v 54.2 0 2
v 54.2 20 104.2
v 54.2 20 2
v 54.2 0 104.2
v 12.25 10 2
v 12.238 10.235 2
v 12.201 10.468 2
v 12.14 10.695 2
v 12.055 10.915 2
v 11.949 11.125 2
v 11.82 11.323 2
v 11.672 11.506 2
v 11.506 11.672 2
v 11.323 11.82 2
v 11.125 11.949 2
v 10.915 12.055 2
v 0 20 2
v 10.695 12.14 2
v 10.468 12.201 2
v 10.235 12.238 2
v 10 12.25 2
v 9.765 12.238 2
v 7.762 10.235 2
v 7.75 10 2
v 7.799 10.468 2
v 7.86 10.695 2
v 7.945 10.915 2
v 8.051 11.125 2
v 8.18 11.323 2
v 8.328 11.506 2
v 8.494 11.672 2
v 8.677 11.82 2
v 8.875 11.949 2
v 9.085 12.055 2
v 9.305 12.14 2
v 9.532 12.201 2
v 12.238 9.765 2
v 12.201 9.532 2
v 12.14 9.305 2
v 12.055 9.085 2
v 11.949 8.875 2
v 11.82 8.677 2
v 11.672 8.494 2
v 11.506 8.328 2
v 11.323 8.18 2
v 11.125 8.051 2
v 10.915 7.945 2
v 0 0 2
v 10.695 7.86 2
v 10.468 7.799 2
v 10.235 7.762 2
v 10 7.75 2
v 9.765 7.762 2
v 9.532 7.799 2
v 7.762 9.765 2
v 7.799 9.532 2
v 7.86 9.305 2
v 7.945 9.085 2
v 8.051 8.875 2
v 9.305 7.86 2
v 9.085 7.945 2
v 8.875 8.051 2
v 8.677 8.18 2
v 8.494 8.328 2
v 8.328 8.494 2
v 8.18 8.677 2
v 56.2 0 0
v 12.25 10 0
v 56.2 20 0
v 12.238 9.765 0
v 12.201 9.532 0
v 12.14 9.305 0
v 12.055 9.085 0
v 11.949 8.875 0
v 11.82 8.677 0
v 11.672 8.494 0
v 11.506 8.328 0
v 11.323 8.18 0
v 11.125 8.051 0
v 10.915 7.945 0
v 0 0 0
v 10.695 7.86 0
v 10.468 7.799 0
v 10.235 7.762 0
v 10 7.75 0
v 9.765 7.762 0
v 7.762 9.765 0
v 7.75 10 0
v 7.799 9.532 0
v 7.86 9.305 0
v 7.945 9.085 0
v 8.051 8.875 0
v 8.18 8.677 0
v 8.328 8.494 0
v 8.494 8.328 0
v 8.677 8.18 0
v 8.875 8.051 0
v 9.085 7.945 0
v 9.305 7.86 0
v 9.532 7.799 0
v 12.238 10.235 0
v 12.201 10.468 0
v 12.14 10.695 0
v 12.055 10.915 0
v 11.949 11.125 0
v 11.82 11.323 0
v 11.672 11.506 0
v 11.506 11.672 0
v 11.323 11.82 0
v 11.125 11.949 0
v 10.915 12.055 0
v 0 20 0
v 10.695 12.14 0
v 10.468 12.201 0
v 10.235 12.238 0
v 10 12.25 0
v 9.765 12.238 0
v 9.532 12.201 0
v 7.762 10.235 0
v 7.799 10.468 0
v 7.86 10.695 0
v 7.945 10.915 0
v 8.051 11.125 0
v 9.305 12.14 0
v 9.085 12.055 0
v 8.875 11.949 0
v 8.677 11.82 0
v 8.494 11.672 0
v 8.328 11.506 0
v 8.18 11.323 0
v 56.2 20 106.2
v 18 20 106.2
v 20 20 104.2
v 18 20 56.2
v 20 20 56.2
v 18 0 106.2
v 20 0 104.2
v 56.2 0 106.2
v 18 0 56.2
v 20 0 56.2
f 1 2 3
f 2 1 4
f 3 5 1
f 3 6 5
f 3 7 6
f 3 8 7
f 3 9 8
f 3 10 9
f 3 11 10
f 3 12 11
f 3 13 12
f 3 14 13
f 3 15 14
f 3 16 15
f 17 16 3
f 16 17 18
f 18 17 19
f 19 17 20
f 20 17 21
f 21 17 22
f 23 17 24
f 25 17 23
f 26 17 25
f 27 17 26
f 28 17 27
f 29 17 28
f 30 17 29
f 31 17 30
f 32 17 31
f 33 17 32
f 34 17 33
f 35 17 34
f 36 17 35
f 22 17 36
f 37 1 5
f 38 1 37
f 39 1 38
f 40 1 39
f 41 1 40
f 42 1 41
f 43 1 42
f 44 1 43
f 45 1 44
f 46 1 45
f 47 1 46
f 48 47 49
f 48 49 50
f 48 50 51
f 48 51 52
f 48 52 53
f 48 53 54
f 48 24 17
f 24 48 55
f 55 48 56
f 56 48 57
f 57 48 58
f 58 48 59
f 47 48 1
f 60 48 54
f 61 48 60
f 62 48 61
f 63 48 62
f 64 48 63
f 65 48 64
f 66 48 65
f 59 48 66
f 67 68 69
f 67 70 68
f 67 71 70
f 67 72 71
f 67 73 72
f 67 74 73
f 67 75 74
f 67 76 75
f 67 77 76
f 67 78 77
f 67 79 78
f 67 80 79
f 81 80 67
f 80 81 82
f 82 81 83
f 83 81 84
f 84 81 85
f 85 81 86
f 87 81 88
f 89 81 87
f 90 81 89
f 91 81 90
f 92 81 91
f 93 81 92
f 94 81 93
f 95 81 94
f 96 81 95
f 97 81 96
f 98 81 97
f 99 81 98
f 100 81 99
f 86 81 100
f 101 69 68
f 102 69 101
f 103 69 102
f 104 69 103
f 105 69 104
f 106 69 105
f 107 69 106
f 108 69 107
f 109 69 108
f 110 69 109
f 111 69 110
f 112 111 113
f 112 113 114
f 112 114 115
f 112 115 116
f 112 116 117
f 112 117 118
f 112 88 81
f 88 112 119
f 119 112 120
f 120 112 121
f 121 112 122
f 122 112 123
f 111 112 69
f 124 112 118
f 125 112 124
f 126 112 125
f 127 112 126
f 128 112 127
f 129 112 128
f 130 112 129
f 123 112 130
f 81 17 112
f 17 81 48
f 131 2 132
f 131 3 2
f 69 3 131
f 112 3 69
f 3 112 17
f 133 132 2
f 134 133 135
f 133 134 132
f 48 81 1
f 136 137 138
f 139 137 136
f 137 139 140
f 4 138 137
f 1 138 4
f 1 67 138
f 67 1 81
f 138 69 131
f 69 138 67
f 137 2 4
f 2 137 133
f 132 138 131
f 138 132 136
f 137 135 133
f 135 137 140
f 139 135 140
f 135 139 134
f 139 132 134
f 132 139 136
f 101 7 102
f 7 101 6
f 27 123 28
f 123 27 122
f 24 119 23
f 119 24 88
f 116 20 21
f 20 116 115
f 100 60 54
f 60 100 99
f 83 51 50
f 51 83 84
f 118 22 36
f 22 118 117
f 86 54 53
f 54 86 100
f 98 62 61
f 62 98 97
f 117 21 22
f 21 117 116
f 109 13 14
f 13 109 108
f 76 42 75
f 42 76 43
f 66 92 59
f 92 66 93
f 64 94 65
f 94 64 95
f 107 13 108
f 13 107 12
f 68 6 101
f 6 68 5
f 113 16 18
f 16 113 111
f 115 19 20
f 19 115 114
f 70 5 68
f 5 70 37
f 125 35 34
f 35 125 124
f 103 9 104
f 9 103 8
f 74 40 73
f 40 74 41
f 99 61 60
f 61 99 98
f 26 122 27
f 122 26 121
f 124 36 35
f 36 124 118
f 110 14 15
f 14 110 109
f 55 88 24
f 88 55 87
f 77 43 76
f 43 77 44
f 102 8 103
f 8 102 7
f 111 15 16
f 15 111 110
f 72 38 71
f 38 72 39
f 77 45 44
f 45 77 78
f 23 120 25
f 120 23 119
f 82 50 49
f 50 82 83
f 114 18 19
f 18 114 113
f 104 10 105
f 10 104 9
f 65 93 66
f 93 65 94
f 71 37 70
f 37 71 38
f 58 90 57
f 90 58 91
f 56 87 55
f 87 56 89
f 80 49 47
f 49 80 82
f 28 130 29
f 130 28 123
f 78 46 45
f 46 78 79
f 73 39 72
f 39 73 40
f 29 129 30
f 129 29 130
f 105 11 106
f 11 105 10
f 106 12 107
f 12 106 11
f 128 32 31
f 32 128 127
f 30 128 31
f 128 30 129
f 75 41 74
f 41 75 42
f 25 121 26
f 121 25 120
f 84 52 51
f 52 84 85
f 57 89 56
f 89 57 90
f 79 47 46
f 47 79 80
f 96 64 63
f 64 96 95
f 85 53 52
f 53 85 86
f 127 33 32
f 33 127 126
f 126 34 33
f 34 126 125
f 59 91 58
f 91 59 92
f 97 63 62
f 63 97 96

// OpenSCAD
// U Bracket - Corrected version for Tinkercad / OpenSCAD 
// Dimensions in mm

difference() {
    // Main solid U-shape
    union() {
       
        // Left flange
        cube([54.2, 20, 2], center = false);
        translate([54.2, 0, 0])
            cube([2, 20, 104.2], center = false);
        translate([20, 0, 104.2])
        cube([36.2, 20, 2], center = false);
        translate([18, 0, 56.2])
            cube([2, 20, 50], center = false);
        
    }

    // Holes for M4 bolts (Ø4.5 mm)
    translate([10, 10, 0])
        cylinder(h = 4, r = 2.25, center = true, $fn = 60);}
    
